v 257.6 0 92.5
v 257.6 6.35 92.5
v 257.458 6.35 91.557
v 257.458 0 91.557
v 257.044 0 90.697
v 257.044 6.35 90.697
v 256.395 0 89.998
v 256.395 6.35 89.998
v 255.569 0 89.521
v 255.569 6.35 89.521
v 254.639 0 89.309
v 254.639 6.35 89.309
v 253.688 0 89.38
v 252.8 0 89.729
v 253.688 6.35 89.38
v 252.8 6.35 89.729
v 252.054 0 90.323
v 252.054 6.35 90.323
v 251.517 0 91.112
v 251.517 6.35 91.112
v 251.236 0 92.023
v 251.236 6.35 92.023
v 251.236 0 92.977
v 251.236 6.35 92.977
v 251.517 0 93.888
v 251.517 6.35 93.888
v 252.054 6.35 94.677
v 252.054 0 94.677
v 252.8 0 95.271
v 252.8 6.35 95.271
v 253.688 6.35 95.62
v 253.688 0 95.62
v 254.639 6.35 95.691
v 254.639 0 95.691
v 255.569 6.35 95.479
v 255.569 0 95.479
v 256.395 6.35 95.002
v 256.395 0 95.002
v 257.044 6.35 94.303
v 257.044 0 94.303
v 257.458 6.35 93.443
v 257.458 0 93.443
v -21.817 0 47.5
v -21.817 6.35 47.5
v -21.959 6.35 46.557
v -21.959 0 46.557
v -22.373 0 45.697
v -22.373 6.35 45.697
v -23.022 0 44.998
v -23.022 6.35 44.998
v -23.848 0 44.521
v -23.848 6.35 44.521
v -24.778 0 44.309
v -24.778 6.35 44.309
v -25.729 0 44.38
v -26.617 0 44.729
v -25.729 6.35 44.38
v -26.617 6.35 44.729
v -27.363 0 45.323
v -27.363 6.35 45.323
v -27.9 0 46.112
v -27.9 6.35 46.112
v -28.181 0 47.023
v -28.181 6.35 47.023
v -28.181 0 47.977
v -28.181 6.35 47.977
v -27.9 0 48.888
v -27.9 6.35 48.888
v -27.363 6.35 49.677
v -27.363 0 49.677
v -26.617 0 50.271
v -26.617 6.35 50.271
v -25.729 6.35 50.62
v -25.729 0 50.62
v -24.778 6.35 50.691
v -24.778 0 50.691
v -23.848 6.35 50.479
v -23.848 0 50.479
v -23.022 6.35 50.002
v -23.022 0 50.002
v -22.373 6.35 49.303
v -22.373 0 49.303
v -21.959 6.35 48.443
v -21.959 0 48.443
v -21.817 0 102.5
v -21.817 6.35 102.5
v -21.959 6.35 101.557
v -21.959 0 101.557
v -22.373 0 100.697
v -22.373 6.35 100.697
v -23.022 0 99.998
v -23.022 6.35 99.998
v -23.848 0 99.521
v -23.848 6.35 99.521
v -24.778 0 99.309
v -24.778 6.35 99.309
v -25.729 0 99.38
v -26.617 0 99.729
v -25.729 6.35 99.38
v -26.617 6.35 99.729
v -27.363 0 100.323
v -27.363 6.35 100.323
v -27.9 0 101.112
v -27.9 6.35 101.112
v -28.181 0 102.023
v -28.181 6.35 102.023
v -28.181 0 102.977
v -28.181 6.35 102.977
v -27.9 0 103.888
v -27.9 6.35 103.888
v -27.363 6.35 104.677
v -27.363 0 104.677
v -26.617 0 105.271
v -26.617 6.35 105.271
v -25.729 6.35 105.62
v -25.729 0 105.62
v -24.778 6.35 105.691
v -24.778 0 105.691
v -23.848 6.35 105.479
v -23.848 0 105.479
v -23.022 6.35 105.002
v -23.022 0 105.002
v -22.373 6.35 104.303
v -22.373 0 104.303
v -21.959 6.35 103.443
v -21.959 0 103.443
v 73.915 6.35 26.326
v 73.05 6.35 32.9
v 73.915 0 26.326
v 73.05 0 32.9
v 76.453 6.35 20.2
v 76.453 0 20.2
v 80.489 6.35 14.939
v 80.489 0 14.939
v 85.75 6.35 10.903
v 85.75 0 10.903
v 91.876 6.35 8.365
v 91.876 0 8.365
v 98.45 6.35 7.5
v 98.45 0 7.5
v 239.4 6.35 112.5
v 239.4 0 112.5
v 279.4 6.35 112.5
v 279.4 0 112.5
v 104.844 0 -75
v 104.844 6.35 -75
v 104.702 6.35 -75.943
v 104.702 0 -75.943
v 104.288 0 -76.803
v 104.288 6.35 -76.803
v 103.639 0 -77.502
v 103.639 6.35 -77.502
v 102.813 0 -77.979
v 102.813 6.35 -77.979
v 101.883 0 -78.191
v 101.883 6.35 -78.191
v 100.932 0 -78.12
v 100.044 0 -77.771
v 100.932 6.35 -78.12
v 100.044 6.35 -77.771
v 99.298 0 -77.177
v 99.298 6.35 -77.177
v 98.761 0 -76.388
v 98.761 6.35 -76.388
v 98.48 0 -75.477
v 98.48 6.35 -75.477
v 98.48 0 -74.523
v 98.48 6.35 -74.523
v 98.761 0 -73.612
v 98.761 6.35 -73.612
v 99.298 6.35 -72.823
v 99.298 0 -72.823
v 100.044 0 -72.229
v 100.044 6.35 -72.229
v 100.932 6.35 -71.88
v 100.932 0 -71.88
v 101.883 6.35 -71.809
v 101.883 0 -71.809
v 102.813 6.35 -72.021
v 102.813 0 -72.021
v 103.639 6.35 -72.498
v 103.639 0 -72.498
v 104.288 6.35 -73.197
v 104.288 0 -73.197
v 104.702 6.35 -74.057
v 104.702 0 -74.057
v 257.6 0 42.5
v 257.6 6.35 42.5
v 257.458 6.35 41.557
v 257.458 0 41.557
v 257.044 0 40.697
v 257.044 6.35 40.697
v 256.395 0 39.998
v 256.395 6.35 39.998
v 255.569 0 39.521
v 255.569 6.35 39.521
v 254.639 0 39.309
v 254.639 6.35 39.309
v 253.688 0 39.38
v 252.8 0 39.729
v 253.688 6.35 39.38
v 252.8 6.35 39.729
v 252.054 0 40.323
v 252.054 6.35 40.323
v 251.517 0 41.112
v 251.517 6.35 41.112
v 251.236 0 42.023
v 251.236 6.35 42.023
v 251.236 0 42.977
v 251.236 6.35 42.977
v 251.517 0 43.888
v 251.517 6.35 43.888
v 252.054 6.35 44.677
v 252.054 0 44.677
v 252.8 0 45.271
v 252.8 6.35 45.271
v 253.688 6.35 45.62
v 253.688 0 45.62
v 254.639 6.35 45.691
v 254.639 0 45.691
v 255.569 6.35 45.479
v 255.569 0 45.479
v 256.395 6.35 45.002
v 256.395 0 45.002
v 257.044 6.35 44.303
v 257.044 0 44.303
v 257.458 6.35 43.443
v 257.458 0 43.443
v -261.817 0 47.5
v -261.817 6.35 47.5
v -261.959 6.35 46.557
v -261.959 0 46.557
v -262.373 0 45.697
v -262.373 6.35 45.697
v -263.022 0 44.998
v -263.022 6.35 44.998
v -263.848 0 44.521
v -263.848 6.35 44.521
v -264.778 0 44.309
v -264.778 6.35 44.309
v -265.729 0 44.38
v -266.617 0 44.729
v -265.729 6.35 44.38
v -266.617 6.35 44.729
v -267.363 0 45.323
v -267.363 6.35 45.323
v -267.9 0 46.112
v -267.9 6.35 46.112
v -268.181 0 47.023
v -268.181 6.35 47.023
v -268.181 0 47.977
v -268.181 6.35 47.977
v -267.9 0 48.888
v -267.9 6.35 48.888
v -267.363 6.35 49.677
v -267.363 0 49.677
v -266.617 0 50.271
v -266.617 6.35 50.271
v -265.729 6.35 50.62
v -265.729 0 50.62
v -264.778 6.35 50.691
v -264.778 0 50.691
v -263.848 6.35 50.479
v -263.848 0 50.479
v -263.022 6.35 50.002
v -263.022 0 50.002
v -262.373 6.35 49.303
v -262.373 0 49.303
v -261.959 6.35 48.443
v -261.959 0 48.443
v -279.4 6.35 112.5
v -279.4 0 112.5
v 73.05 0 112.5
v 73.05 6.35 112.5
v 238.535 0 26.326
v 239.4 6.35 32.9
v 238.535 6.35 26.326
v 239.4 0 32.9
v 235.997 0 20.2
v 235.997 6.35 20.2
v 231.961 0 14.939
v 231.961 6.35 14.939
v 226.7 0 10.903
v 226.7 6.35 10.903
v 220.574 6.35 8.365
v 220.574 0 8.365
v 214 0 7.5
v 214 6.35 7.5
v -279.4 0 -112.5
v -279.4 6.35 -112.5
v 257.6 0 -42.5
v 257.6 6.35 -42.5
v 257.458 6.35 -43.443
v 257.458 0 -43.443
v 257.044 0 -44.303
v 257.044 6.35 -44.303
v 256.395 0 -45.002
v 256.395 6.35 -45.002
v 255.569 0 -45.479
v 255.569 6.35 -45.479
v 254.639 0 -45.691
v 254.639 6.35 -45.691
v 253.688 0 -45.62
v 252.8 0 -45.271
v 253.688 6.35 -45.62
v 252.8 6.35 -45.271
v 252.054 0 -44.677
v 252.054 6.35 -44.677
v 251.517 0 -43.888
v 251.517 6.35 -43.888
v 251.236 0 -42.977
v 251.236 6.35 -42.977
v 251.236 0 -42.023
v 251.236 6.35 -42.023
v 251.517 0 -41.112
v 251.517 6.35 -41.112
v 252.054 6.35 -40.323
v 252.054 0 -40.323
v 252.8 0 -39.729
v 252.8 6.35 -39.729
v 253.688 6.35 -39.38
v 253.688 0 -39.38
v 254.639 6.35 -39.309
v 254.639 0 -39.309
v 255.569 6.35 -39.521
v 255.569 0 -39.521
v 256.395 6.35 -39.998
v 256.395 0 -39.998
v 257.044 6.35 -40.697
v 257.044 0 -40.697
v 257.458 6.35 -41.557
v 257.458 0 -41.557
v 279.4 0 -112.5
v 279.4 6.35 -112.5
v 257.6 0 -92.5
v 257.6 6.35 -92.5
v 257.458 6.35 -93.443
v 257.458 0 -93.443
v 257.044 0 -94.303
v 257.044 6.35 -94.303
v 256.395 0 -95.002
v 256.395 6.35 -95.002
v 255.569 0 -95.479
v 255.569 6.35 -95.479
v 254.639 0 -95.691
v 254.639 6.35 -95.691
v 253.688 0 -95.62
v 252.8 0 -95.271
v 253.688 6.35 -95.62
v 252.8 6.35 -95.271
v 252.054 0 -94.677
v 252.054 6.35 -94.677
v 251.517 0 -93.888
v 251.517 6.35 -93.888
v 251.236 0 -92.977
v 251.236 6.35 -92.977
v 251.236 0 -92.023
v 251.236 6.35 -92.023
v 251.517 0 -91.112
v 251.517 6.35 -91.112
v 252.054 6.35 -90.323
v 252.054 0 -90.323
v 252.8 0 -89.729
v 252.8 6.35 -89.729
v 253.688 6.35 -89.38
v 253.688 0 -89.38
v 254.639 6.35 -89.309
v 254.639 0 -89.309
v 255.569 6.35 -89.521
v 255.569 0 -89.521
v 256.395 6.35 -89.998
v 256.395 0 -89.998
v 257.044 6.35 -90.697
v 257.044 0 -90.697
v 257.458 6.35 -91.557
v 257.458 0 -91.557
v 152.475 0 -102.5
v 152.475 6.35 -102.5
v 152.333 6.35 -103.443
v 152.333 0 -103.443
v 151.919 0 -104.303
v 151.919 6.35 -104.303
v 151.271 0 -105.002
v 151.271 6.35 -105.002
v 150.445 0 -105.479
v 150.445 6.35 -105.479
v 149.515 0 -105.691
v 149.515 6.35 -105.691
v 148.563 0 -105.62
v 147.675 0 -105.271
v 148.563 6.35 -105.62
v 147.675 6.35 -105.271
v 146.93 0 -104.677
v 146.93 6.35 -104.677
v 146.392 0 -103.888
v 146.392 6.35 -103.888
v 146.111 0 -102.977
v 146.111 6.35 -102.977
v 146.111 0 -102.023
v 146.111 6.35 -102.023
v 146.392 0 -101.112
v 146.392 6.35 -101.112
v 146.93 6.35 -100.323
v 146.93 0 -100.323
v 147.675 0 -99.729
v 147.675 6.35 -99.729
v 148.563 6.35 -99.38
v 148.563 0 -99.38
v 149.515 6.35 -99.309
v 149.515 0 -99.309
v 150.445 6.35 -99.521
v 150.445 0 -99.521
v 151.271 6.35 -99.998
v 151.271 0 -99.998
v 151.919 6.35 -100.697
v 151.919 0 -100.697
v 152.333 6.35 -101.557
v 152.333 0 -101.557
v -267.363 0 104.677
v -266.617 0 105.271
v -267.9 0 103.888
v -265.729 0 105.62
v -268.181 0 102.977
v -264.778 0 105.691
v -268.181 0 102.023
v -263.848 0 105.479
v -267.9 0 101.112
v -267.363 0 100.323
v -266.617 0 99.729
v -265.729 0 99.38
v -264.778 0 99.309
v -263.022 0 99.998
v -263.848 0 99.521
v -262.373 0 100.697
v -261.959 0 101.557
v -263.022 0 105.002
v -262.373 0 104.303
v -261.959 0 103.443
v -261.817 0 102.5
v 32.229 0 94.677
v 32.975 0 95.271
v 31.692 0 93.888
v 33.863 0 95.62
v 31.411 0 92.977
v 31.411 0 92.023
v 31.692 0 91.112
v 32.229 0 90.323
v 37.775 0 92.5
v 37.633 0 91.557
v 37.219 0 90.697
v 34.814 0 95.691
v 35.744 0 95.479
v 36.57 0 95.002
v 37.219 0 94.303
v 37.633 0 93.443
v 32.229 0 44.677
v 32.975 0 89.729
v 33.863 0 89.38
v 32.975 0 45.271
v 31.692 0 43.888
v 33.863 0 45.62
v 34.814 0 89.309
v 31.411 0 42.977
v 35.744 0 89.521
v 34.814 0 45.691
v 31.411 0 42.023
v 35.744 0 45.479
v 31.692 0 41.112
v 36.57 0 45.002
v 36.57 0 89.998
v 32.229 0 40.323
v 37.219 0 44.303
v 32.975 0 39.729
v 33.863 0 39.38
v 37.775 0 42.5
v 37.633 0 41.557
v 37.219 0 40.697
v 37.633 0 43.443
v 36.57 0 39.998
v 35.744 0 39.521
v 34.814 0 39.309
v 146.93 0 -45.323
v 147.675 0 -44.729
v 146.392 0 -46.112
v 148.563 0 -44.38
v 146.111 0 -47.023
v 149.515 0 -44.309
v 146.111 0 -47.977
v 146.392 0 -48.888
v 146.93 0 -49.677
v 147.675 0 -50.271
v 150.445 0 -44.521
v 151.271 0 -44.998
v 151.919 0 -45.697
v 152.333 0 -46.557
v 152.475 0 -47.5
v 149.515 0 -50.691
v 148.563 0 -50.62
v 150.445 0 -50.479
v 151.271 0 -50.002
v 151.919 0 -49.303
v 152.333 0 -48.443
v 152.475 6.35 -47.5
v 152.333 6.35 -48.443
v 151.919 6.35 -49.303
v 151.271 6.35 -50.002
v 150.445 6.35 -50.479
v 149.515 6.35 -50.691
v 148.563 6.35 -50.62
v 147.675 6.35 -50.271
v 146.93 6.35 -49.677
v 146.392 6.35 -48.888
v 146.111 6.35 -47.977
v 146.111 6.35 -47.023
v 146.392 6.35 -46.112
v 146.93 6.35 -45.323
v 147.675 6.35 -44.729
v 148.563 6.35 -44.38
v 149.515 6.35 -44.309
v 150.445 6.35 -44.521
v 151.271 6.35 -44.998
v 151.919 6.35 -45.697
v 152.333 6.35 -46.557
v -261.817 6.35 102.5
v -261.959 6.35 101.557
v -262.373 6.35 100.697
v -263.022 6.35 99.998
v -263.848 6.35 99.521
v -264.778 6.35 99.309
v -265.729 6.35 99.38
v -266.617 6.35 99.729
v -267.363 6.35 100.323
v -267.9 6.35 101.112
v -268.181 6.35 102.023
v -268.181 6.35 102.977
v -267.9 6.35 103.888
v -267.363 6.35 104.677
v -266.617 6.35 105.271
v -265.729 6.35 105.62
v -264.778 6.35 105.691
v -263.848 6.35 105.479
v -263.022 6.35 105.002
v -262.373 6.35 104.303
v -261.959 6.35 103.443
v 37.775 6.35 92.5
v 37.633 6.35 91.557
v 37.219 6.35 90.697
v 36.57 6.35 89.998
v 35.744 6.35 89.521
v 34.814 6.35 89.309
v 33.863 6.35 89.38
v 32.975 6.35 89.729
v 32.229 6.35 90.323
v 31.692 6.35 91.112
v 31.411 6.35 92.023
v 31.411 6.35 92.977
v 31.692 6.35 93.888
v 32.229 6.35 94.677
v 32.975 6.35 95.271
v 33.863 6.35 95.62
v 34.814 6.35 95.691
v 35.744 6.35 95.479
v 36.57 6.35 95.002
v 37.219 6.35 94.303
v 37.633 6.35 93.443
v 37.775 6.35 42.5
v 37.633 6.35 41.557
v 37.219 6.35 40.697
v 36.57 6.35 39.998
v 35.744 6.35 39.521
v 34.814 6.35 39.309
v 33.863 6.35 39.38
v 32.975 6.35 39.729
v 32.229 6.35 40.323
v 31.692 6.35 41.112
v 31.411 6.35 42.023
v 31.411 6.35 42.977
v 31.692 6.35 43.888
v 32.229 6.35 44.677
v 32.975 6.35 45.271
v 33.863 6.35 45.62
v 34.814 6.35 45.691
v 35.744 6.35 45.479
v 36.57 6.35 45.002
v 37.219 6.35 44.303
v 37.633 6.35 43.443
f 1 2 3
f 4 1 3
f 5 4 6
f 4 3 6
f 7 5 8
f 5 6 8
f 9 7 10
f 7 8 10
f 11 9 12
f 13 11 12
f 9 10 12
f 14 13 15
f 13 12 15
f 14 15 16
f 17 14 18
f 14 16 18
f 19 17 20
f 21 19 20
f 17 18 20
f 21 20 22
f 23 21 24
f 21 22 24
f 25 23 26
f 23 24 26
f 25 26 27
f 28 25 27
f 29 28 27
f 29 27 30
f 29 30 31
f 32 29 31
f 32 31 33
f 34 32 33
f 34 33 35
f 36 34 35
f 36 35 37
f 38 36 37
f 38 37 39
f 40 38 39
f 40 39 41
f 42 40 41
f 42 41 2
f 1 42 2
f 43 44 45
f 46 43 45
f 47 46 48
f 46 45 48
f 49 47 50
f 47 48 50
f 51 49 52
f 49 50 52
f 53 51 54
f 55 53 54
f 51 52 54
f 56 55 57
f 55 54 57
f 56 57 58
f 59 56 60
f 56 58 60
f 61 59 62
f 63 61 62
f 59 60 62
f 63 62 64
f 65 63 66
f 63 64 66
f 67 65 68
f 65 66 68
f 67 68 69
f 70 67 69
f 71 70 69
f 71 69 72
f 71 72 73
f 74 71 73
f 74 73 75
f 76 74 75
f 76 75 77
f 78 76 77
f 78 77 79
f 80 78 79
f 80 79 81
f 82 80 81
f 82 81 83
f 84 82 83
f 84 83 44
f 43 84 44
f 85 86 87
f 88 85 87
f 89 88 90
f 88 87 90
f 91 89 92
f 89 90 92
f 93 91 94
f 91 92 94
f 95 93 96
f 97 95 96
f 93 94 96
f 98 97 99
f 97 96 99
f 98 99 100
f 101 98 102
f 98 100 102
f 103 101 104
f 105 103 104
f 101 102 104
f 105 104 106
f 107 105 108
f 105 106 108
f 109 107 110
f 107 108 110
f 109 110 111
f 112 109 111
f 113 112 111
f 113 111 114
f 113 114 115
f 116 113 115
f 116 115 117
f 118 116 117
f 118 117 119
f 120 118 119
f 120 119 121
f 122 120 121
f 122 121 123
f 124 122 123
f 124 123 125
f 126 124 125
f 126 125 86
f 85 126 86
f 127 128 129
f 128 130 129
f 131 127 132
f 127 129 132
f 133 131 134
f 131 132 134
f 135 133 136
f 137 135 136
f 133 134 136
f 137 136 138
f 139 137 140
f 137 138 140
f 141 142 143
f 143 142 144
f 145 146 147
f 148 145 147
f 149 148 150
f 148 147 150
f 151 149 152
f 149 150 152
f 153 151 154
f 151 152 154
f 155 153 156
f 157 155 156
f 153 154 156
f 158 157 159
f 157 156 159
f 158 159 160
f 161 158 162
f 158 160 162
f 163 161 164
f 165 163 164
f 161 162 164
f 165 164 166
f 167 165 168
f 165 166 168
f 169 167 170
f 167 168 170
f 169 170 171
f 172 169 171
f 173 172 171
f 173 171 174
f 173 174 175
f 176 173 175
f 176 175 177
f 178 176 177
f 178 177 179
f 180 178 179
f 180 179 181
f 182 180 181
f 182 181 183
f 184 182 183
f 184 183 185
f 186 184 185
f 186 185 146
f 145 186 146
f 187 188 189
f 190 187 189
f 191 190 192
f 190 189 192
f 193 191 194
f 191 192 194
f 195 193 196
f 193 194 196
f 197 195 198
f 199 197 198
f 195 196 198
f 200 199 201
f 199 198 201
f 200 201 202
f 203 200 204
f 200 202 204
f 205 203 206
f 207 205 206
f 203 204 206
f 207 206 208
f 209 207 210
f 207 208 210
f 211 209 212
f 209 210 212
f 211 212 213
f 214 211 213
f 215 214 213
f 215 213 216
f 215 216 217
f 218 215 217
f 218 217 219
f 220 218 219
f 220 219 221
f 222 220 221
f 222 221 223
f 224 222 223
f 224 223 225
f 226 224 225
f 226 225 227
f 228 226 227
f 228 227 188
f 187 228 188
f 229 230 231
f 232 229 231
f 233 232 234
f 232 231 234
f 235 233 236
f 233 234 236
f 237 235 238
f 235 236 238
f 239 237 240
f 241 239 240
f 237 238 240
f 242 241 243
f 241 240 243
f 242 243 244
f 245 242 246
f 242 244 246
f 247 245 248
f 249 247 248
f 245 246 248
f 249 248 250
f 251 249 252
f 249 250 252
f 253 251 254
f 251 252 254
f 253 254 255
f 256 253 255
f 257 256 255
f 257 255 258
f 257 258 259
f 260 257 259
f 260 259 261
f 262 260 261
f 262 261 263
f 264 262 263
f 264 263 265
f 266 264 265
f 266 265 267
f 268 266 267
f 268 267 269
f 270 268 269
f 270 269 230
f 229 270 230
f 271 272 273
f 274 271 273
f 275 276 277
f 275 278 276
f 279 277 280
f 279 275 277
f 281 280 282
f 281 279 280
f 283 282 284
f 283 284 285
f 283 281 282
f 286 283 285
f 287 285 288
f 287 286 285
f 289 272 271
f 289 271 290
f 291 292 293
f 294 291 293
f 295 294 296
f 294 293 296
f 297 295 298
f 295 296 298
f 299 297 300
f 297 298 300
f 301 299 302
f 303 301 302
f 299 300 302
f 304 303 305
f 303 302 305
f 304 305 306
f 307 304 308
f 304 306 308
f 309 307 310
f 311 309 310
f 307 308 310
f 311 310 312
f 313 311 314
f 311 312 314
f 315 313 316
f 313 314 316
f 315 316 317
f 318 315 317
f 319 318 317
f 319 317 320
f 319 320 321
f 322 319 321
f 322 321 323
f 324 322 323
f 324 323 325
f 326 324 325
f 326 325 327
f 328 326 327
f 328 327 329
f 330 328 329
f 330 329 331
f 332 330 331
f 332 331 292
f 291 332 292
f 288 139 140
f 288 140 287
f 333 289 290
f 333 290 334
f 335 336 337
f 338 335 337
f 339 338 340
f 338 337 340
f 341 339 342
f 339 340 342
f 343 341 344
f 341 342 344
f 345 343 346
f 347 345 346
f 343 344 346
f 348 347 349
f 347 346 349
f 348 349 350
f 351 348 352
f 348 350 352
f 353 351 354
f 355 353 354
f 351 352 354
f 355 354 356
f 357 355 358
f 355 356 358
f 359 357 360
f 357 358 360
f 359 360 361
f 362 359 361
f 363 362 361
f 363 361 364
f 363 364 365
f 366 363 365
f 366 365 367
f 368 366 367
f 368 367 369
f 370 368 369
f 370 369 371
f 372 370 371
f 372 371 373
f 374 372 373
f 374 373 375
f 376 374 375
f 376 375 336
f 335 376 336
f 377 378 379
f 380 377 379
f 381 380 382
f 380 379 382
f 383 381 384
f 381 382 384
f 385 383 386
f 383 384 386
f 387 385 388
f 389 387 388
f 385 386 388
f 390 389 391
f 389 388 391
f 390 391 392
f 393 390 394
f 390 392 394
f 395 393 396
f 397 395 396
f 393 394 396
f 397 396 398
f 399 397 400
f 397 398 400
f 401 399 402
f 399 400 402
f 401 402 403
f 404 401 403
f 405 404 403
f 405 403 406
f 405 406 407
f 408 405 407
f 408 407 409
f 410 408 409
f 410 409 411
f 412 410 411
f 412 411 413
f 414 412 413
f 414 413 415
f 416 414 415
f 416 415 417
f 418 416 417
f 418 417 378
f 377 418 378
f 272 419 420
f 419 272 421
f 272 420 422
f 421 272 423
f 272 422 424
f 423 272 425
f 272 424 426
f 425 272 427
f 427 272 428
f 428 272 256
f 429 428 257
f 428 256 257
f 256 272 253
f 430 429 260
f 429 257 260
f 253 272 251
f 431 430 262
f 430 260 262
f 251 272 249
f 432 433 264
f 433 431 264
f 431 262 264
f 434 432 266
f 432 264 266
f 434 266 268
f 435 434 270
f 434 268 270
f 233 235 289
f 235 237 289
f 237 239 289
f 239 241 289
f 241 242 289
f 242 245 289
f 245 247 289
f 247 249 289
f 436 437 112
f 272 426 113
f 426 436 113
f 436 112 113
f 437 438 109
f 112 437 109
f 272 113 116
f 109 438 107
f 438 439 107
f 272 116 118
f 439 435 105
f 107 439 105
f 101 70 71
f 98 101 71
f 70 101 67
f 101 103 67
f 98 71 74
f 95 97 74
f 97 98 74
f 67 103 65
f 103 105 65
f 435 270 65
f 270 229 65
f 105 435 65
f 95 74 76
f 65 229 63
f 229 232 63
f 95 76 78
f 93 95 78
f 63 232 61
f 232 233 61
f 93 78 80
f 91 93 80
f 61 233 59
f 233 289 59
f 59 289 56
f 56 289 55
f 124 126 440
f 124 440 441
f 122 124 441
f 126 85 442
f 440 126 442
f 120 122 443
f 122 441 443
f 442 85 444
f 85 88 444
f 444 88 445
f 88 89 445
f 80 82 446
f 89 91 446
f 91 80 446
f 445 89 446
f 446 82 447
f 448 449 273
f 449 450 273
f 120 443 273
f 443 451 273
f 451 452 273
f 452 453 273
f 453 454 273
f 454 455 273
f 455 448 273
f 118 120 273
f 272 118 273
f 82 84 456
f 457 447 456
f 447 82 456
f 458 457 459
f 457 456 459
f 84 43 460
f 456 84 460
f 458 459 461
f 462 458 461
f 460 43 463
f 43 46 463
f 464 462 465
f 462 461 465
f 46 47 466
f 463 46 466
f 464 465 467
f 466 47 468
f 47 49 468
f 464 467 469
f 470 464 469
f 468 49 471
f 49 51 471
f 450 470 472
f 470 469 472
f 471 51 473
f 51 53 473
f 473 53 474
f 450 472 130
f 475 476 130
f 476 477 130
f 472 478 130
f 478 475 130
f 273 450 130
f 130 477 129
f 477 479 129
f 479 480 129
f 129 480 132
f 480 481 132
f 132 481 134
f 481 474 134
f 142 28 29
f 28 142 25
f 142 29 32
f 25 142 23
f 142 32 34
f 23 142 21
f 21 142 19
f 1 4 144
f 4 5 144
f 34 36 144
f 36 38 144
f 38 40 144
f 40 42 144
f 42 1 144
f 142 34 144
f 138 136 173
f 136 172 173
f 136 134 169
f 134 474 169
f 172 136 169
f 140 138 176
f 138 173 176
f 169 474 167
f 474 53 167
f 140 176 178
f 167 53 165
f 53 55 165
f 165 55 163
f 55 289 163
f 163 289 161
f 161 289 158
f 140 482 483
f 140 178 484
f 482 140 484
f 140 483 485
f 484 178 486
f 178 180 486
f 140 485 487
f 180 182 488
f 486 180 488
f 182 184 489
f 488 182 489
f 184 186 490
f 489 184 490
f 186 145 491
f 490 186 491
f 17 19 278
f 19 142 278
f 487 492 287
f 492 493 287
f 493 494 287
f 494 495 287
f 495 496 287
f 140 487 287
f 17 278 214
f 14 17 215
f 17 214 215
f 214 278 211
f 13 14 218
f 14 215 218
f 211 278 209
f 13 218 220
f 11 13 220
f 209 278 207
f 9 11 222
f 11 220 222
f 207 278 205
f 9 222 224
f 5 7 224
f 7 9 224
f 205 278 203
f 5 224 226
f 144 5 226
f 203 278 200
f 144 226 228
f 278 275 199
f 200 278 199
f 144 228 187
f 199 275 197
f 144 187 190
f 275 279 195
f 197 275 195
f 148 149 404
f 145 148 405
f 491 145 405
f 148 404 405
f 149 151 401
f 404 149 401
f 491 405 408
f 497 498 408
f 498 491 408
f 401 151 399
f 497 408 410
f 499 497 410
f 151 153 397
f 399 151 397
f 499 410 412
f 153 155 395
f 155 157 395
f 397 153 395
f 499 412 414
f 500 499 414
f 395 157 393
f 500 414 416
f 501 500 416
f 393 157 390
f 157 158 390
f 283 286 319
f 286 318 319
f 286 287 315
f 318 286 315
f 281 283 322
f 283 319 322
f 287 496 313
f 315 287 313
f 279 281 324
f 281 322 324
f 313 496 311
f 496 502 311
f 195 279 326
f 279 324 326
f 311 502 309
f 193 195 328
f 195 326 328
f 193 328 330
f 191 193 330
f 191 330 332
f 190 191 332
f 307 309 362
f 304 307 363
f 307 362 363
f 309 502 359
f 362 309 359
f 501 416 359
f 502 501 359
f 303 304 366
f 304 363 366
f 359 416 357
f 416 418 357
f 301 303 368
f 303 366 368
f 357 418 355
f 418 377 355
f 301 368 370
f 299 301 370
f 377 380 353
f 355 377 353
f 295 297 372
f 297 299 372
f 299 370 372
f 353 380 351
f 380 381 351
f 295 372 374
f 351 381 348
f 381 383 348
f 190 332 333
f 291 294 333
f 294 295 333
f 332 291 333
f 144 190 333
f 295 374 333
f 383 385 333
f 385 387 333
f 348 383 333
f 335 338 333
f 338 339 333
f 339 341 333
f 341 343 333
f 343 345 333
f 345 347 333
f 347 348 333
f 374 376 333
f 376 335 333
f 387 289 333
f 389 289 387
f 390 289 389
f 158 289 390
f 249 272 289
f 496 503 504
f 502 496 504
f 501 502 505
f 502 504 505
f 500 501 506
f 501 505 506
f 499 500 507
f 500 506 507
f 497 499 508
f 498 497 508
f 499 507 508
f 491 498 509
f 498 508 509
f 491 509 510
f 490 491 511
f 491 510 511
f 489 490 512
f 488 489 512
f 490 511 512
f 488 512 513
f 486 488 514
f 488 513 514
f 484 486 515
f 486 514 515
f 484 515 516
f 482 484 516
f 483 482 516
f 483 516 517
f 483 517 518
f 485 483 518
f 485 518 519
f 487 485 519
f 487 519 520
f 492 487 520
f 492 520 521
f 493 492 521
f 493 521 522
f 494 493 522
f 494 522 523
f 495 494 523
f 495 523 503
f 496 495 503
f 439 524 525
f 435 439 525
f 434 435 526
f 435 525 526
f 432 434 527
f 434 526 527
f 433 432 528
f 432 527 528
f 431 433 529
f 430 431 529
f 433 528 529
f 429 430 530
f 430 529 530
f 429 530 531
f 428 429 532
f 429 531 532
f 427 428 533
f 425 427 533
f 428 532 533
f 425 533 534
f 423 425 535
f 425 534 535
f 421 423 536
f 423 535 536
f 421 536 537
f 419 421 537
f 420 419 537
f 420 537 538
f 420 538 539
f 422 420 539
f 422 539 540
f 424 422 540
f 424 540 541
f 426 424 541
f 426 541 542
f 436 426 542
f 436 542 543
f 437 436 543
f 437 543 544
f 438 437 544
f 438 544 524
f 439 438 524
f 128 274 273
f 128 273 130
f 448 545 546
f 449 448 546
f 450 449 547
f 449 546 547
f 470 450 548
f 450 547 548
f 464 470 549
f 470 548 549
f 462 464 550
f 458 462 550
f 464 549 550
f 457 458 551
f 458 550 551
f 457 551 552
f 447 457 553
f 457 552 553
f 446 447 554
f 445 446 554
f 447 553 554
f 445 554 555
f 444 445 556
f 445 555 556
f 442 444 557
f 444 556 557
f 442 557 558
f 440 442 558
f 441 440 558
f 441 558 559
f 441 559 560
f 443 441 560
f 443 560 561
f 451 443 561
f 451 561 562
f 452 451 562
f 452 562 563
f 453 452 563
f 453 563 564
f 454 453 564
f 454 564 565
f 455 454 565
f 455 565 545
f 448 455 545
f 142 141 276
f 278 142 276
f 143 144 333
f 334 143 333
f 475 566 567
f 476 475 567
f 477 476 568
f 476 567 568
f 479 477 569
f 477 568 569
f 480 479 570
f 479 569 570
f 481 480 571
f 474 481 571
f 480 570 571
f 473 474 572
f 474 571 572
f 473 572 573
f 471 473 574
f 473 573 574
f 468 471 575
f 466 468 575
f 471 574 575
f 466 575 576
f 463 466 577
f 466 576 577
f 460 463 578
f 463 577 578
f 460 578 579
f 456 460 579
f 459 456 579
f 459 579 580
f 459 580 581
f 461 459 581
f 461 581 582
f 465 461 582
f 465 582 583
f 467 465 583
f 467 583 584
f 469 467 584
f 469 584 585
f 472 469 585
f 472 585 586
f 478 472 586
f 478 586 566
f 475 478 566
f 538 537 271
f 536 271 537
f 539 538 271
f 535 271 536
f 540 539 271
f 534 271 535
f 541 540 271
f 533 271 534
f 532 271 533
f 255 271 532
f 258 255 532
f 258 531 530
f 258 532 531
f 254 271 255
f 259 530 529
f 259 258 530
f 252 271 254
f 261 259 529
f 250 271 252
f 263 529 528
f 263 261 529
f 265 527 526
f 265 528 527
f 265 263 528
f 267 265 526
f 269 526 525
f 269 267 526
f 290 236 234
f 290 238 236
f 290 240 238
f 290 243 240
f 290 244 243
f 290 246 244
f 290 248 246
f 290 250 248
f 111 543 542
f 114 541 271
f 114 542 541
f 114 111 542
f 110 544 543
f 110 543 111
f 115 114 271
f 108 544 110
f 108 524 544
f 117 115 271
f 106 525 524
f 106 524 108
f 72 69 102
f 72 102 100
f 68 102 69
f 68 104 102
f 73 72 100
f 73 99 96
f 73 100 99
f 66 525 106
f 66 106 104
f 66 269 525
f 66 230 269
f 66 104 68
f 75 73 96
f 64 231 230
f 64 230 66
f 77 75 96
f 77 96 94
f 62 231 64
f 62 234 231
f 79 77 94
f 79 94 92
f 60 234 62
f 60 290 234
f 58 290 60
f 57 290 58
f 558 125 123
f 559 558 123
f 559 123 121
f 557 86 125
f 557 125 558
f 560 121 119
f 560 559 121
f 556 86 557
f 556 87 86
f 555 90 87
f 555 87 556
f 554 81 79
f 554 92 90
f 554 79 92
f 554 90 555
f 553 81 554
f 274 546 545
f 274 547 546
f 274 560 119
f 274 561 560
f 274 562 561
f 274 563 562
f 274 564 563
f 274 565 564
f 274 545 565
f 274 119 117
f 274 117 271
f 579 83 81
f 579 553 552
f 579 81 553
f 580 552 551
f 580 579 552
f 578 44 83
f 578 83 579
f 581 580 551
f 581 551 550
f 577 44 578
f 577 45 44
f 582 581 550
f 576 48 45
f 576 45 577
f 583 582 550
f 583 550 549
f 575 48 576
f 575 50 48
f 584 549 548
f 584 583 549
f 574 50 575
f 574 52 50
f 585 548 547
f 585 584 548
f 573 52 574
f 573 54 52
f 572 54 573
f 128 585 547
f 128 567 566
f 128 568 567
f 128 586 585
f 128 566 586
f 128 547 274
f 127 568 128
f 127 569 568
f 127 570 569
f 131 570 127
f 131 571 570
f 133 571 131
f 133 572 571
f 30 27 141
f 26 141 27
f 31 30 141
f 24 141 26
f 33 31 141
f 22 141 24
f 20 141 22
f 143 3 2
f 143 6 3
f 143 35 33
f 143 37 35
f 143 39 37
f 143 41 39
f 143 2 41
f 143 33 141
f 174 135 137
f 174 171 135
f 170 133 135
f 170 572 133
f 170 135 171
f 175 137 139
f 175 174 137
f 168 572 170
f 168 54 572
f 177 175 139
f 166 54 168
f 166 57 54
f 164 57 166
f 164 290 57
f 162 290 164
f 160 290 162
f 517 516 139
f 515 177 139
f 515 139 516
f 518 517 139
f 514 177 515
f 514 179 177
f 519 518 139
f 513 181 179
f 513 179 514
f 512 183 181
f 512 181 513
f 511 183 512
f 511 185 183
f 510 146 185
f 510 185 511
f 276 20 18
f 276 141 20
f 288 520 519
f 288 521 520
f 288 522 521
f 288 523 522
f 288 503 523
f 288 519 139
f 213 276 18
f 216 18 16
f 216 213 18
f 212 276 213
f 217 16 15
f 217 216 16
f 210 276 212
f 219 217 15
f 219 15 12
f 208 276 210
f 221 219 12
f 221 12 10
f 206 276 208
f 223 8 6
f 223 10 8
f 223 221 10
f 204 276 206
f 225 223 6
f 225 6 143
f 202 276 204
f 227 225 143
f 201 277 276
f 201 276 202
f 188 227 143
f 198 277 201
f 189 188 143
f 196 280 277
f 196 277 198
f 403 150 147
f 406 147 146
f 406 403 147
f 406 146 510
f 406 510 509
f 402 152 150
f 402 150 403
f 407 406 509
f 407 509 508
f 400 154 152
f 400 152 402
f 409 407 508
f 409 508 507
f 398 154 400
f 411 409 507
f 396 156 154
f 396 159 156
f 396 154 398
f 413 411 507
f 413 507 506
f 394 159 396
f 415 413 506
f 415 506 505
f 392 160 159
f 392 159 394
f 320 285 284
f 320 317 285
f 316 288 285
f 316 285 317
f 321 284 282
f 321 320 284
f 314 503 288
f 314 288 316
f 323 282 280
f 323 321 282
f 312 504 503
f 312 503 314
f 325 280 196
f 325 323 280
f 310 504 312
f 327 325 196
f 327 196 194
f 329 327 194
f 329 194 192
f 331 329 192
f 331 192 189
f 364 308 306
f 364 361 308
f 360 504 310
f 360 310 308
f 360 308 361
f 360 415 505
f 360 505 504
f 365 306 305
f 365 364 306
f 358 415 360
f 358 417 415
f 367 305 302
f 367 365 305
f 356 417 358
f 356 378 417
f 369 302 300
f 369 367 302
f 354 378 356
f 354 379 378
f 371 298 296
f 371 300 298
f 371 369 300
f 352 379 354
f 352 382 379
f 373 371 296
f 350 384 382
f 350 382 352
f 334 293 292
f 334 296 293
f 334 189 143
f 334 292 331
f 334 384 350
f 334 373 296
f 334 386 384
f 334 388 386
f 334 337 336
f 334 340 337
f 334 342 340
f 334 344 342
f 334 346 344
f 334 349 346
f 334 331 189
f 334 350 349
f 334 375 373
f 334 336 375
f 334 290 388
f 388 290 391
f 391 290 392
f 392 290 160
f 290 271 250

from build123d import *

# Parameters (mm, degrees)
SKETCH1_W           = 558.8
SKETCH1_H           = 225
BOSS_EXTRUDE1_DEPTH = 6.35
SKETCH2_W           = 166.35
SKETCH2_H           = 143.7
CUT_EXTRUDE1_DEPTH  = 7.35
FILLET1_R           = 25.4
SKETCH3_R           = 3.2
CUT_EXTRUDE2_DEPTH  = 7.35


with BuildPart() as part:
    # Sketch1 → Boss-Extrude1 (new body)
    with BuildSketch(Plane(origin=(0, 0, 0), x_dir=(1, 0, 0), z_dir=(0, 1, 0))):
        Rectangle(SKETCH1_W, SKETCH1_H)
    extrude(amount=BOSS_EXTRUDE1_DEPTH)

    # Sketch2 → Cut-Extrude1 (cut, through all)
    with BuildSketch(Plane(origin=(0, 6.35, 0), x_dir=(1, 0, 0), z_dir=(0, 1, 0))):
        with Locations((156.225, -79.35)):
            Rectangle(SKETCH2_W, SKETCH2_H)
    extrude(amount=-CUT_EXTRUDE1_DEPTH, mode=Mode.SUBTRACT)

    # Fillet1
    fillet1_edges = [part.edges().sort_by_distance(p)[0] for p in [
        (239.4, 3.175, 7.5),
        (73.05, 3.175, 7.5),
    ]]
    fillet(fillet1_edges, radius=FILLET1_R)

    # Sketch3 → Cut-Extrude2 (cut, through all)
    with BuildSketch(Plane(origin=(0, 6.35, 0), x_dir=(1, 0, 0), z_dir=(0, 1, 0))):
        with Locations((-265.017168878, -102.5)):
            Circle(SKETCH3_R)
        with Locations((-265.017168878, -47.5)):
            Circle(SKETCH3_R)
        with Locations((-25.017168878, -47.5)):
            Circle(SKETCH3_R)
        with Locations((-25.017168878, -102.5)):
            Circle(SKETCH3_R)
        with Locations((101.644095195, 75)):
            Circle(SKETCH3_R)
        with Locations((149.275492403, 102.5)):
            Circle(SKETCH3_R)
        with Locations((149.275492403, 47.5)):
            Circle(SKETCH3_R)
        with Locations((254.4, 92.5)):
            Circle(SKETCH3_R)
        with Locations((254.4, 42.5)):
            Circle(SKETCH3_R)
        with Locations((254.4, -42.5)):
            Circle(SKETCH3_R)
        with Locations((254.4, -92.5)):
            Circle(SKETCH3_R)
        with Locations((34.575, -42.5)):
            Circle(SKETCH3_R)
        with Locations((34.575, -92.5)):
            Circle(SKETCH3_R)
    extrude(amount=-CUT_EXTRUDE2_DEPTH, mode=Mode.SUBTRACT)


solid = part.part
